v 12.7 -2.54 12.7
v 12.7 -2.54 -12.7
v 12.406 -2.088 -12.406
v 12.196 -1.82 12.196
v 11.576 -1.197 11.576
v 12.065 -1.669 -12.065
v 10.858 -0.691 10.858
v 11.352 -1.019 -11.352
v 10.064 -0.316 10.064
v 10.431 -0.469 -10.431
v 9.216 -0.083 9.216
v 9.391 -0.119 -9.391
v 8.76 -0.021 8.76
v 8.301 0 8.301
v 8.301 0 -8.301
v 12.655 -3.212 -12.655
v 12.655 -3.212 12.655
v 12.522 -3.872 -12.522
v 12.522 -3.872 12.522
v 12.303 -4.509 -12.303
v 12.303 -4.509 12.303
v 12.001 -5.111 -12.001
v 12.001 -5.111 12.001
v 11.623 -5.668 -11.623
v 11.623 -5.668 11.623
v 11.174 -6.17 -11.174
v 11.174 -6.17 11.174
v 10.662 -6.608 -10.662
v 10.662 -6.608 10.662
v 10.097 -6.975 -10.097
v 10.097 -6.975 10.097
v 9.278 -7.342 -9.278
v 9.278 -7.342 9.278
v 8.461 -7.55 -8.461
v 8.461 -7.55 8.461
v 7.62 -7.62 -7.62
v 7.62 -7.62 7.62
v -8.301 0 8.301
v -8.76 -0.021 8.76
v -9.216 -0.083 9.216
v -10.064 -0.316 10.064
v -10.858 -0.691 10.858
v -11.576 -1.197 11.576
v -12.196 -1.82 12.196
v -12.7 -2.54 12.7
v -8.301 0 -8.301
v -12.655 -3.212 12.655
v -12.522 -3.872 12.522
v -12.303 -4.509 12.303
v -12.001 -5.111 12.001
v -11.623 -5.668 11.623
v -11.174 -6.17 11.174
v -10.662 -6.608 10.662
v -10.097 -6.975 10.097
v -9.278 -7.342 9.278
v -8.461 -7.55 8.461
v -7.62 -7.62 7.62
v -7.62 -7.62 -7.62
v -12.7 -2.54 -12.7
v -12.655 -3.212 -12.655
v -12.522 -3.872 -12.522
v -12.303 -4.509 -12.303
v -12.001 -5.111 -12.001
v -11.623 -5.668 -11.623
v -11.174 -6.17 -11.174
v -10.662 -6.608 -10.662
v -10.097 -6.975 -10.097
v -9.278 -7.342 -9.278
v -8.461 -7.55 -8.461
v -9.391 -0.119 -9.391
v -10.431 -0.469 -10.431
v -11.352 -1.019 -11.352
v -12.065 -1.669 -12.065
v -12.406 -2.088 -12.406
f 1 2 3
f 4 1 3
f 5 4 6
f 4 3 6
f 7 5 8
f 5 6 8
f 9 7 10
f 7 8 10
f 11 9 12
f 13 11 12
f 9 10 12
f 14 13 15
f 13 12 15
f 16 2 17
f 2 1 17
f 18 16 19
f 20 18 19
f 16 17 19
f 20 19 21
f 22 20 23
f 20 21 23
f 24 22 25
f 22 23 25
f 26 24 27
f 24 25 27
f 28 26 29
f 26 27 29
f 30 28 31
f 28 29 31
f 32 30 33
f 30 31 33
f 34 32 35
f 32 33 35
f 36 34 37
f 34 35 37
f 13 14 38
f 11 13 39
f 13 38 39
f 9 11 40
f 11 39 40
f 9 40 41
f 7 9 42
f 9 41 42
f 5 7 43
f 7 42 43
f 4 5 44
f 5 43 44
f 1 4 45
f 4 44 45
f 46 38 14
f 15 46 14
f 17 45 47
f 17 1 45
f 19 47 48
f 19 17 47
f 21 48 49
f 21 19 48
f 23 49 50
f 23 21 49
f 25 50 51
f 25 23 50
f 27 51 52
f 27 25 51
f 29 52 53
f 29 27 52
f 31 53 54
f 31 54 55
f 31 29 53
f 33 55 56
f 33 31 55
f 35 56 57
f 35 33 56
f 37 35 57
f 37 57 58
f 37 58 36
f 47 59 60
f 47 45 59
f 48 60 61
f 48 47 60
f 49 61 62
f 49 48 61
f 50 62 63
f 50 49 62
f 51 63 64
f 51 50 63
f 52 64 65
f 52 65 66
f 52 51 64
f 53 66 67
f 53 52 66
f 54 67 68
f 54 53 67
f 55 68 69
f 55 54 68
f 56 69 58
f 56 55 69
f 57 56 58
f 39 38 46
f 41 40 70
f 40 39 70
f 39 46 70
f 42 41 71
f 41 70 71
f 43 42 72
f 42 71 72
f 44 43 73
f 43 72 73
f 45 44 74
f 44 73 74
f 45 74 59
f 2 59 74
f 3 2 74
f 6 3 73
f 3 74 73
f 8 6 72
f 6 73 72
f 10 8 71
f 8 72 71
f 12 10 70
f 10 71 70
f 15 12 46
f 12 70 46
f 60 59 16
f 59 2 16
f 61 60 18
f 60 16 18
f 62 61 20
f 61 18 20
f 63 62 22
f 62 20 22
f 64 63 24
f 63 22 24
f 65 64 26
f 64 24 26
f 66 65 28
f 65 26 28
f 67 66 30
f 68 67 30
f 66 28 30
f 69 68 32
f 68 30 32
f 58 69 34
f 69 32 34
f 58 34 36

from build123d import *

# Parameters (mm, degrees)
F0_W        = 25.4
F0_H        = 25.4
F1_DEPTH    = 7.62
F2_R        = 5.08
F3_T1_DEPTH = 47.3970452561
F3_T3_DEPTH = 47.3970452561


# Not quite as in the source:
# - a fillet or chamfer that OpenCascade refuses, or shapes differently, is made with other operations: its cross-section is extruded or revolved along the edge and cut away or added


with BuildPart() as f1:
    # F0 (on Front) → F1 (new body)
    with BuildSketch(Plane.XZ):
        Rectangle(F0_W, F0_H)
    extrude(amount=F1_DEPTH)

    # F2
    f2_edges = [f1.edges().sort_by_distance(p)[0] for p in [
        (0, -7.62, 12.7),
        (-12.7, -7.62, 0),
        (12.7, -7.62, 0),
        (0, -7.62, -12.7),
    ]]
    fillet(f2_edges, radius=F2_R)

    # F3: fillet of radius 5.08 on 4 edges, made by hand

    # F3_s2 → F3_t1 (cut)
    with BuildSketch(Plane.YZ.offset(-23.6985226281)):
        with BuildLine():
            ThreePointArc((-2.54, -12.7), (-0.6805909488, -10.8405909488), (0, -8.3005909488))
            Line((0, -8.3005909488), (0, -12.7))
            Line((0, -12.7), (-2.54, -12.7))
        make_face()
        with BuildLine():
            ThreePointArc((0, 8.3005909488), (-0.6805909488, 10.8405909488), (-2.54, 12.7))
            Line((-2.54, 12.7), (0, 12.7))
            Line((0, 12.7), (0, 8.3005909488))
        make_face()
    extrude(amount=F3_T1_DEPTH, mode=Mode.SUBTRACT)

    # F3_s4 → F3_t3 (cut)
    with BuildSketch(Plane.XY.offset(-23.6985226281)):
        with BuildLine():
            ThreePointArc((-8.3005909488, 0), (-10.8405909488, -0.6805909488), (-12.7, -2.54))
            Line((-12.7, -2.54), (-12.7, 0))
            Line((-12.7, 0), (-8.3005909488, 0))
        make_face()
        with BuildLine():
            ThreePointArc((12.7, -2.54), (10.8405909488, -0.6805909488), (8.3005909488, 0))
            Line((8.3005909488, 0), (12.7, 0))
            Line((12.7, 0), (12.7, -2.54))
        make_face()
    extrude(amount=F3_T3_DEPTH, mode=Mode.SUBTRACT)


solid = f1.part
